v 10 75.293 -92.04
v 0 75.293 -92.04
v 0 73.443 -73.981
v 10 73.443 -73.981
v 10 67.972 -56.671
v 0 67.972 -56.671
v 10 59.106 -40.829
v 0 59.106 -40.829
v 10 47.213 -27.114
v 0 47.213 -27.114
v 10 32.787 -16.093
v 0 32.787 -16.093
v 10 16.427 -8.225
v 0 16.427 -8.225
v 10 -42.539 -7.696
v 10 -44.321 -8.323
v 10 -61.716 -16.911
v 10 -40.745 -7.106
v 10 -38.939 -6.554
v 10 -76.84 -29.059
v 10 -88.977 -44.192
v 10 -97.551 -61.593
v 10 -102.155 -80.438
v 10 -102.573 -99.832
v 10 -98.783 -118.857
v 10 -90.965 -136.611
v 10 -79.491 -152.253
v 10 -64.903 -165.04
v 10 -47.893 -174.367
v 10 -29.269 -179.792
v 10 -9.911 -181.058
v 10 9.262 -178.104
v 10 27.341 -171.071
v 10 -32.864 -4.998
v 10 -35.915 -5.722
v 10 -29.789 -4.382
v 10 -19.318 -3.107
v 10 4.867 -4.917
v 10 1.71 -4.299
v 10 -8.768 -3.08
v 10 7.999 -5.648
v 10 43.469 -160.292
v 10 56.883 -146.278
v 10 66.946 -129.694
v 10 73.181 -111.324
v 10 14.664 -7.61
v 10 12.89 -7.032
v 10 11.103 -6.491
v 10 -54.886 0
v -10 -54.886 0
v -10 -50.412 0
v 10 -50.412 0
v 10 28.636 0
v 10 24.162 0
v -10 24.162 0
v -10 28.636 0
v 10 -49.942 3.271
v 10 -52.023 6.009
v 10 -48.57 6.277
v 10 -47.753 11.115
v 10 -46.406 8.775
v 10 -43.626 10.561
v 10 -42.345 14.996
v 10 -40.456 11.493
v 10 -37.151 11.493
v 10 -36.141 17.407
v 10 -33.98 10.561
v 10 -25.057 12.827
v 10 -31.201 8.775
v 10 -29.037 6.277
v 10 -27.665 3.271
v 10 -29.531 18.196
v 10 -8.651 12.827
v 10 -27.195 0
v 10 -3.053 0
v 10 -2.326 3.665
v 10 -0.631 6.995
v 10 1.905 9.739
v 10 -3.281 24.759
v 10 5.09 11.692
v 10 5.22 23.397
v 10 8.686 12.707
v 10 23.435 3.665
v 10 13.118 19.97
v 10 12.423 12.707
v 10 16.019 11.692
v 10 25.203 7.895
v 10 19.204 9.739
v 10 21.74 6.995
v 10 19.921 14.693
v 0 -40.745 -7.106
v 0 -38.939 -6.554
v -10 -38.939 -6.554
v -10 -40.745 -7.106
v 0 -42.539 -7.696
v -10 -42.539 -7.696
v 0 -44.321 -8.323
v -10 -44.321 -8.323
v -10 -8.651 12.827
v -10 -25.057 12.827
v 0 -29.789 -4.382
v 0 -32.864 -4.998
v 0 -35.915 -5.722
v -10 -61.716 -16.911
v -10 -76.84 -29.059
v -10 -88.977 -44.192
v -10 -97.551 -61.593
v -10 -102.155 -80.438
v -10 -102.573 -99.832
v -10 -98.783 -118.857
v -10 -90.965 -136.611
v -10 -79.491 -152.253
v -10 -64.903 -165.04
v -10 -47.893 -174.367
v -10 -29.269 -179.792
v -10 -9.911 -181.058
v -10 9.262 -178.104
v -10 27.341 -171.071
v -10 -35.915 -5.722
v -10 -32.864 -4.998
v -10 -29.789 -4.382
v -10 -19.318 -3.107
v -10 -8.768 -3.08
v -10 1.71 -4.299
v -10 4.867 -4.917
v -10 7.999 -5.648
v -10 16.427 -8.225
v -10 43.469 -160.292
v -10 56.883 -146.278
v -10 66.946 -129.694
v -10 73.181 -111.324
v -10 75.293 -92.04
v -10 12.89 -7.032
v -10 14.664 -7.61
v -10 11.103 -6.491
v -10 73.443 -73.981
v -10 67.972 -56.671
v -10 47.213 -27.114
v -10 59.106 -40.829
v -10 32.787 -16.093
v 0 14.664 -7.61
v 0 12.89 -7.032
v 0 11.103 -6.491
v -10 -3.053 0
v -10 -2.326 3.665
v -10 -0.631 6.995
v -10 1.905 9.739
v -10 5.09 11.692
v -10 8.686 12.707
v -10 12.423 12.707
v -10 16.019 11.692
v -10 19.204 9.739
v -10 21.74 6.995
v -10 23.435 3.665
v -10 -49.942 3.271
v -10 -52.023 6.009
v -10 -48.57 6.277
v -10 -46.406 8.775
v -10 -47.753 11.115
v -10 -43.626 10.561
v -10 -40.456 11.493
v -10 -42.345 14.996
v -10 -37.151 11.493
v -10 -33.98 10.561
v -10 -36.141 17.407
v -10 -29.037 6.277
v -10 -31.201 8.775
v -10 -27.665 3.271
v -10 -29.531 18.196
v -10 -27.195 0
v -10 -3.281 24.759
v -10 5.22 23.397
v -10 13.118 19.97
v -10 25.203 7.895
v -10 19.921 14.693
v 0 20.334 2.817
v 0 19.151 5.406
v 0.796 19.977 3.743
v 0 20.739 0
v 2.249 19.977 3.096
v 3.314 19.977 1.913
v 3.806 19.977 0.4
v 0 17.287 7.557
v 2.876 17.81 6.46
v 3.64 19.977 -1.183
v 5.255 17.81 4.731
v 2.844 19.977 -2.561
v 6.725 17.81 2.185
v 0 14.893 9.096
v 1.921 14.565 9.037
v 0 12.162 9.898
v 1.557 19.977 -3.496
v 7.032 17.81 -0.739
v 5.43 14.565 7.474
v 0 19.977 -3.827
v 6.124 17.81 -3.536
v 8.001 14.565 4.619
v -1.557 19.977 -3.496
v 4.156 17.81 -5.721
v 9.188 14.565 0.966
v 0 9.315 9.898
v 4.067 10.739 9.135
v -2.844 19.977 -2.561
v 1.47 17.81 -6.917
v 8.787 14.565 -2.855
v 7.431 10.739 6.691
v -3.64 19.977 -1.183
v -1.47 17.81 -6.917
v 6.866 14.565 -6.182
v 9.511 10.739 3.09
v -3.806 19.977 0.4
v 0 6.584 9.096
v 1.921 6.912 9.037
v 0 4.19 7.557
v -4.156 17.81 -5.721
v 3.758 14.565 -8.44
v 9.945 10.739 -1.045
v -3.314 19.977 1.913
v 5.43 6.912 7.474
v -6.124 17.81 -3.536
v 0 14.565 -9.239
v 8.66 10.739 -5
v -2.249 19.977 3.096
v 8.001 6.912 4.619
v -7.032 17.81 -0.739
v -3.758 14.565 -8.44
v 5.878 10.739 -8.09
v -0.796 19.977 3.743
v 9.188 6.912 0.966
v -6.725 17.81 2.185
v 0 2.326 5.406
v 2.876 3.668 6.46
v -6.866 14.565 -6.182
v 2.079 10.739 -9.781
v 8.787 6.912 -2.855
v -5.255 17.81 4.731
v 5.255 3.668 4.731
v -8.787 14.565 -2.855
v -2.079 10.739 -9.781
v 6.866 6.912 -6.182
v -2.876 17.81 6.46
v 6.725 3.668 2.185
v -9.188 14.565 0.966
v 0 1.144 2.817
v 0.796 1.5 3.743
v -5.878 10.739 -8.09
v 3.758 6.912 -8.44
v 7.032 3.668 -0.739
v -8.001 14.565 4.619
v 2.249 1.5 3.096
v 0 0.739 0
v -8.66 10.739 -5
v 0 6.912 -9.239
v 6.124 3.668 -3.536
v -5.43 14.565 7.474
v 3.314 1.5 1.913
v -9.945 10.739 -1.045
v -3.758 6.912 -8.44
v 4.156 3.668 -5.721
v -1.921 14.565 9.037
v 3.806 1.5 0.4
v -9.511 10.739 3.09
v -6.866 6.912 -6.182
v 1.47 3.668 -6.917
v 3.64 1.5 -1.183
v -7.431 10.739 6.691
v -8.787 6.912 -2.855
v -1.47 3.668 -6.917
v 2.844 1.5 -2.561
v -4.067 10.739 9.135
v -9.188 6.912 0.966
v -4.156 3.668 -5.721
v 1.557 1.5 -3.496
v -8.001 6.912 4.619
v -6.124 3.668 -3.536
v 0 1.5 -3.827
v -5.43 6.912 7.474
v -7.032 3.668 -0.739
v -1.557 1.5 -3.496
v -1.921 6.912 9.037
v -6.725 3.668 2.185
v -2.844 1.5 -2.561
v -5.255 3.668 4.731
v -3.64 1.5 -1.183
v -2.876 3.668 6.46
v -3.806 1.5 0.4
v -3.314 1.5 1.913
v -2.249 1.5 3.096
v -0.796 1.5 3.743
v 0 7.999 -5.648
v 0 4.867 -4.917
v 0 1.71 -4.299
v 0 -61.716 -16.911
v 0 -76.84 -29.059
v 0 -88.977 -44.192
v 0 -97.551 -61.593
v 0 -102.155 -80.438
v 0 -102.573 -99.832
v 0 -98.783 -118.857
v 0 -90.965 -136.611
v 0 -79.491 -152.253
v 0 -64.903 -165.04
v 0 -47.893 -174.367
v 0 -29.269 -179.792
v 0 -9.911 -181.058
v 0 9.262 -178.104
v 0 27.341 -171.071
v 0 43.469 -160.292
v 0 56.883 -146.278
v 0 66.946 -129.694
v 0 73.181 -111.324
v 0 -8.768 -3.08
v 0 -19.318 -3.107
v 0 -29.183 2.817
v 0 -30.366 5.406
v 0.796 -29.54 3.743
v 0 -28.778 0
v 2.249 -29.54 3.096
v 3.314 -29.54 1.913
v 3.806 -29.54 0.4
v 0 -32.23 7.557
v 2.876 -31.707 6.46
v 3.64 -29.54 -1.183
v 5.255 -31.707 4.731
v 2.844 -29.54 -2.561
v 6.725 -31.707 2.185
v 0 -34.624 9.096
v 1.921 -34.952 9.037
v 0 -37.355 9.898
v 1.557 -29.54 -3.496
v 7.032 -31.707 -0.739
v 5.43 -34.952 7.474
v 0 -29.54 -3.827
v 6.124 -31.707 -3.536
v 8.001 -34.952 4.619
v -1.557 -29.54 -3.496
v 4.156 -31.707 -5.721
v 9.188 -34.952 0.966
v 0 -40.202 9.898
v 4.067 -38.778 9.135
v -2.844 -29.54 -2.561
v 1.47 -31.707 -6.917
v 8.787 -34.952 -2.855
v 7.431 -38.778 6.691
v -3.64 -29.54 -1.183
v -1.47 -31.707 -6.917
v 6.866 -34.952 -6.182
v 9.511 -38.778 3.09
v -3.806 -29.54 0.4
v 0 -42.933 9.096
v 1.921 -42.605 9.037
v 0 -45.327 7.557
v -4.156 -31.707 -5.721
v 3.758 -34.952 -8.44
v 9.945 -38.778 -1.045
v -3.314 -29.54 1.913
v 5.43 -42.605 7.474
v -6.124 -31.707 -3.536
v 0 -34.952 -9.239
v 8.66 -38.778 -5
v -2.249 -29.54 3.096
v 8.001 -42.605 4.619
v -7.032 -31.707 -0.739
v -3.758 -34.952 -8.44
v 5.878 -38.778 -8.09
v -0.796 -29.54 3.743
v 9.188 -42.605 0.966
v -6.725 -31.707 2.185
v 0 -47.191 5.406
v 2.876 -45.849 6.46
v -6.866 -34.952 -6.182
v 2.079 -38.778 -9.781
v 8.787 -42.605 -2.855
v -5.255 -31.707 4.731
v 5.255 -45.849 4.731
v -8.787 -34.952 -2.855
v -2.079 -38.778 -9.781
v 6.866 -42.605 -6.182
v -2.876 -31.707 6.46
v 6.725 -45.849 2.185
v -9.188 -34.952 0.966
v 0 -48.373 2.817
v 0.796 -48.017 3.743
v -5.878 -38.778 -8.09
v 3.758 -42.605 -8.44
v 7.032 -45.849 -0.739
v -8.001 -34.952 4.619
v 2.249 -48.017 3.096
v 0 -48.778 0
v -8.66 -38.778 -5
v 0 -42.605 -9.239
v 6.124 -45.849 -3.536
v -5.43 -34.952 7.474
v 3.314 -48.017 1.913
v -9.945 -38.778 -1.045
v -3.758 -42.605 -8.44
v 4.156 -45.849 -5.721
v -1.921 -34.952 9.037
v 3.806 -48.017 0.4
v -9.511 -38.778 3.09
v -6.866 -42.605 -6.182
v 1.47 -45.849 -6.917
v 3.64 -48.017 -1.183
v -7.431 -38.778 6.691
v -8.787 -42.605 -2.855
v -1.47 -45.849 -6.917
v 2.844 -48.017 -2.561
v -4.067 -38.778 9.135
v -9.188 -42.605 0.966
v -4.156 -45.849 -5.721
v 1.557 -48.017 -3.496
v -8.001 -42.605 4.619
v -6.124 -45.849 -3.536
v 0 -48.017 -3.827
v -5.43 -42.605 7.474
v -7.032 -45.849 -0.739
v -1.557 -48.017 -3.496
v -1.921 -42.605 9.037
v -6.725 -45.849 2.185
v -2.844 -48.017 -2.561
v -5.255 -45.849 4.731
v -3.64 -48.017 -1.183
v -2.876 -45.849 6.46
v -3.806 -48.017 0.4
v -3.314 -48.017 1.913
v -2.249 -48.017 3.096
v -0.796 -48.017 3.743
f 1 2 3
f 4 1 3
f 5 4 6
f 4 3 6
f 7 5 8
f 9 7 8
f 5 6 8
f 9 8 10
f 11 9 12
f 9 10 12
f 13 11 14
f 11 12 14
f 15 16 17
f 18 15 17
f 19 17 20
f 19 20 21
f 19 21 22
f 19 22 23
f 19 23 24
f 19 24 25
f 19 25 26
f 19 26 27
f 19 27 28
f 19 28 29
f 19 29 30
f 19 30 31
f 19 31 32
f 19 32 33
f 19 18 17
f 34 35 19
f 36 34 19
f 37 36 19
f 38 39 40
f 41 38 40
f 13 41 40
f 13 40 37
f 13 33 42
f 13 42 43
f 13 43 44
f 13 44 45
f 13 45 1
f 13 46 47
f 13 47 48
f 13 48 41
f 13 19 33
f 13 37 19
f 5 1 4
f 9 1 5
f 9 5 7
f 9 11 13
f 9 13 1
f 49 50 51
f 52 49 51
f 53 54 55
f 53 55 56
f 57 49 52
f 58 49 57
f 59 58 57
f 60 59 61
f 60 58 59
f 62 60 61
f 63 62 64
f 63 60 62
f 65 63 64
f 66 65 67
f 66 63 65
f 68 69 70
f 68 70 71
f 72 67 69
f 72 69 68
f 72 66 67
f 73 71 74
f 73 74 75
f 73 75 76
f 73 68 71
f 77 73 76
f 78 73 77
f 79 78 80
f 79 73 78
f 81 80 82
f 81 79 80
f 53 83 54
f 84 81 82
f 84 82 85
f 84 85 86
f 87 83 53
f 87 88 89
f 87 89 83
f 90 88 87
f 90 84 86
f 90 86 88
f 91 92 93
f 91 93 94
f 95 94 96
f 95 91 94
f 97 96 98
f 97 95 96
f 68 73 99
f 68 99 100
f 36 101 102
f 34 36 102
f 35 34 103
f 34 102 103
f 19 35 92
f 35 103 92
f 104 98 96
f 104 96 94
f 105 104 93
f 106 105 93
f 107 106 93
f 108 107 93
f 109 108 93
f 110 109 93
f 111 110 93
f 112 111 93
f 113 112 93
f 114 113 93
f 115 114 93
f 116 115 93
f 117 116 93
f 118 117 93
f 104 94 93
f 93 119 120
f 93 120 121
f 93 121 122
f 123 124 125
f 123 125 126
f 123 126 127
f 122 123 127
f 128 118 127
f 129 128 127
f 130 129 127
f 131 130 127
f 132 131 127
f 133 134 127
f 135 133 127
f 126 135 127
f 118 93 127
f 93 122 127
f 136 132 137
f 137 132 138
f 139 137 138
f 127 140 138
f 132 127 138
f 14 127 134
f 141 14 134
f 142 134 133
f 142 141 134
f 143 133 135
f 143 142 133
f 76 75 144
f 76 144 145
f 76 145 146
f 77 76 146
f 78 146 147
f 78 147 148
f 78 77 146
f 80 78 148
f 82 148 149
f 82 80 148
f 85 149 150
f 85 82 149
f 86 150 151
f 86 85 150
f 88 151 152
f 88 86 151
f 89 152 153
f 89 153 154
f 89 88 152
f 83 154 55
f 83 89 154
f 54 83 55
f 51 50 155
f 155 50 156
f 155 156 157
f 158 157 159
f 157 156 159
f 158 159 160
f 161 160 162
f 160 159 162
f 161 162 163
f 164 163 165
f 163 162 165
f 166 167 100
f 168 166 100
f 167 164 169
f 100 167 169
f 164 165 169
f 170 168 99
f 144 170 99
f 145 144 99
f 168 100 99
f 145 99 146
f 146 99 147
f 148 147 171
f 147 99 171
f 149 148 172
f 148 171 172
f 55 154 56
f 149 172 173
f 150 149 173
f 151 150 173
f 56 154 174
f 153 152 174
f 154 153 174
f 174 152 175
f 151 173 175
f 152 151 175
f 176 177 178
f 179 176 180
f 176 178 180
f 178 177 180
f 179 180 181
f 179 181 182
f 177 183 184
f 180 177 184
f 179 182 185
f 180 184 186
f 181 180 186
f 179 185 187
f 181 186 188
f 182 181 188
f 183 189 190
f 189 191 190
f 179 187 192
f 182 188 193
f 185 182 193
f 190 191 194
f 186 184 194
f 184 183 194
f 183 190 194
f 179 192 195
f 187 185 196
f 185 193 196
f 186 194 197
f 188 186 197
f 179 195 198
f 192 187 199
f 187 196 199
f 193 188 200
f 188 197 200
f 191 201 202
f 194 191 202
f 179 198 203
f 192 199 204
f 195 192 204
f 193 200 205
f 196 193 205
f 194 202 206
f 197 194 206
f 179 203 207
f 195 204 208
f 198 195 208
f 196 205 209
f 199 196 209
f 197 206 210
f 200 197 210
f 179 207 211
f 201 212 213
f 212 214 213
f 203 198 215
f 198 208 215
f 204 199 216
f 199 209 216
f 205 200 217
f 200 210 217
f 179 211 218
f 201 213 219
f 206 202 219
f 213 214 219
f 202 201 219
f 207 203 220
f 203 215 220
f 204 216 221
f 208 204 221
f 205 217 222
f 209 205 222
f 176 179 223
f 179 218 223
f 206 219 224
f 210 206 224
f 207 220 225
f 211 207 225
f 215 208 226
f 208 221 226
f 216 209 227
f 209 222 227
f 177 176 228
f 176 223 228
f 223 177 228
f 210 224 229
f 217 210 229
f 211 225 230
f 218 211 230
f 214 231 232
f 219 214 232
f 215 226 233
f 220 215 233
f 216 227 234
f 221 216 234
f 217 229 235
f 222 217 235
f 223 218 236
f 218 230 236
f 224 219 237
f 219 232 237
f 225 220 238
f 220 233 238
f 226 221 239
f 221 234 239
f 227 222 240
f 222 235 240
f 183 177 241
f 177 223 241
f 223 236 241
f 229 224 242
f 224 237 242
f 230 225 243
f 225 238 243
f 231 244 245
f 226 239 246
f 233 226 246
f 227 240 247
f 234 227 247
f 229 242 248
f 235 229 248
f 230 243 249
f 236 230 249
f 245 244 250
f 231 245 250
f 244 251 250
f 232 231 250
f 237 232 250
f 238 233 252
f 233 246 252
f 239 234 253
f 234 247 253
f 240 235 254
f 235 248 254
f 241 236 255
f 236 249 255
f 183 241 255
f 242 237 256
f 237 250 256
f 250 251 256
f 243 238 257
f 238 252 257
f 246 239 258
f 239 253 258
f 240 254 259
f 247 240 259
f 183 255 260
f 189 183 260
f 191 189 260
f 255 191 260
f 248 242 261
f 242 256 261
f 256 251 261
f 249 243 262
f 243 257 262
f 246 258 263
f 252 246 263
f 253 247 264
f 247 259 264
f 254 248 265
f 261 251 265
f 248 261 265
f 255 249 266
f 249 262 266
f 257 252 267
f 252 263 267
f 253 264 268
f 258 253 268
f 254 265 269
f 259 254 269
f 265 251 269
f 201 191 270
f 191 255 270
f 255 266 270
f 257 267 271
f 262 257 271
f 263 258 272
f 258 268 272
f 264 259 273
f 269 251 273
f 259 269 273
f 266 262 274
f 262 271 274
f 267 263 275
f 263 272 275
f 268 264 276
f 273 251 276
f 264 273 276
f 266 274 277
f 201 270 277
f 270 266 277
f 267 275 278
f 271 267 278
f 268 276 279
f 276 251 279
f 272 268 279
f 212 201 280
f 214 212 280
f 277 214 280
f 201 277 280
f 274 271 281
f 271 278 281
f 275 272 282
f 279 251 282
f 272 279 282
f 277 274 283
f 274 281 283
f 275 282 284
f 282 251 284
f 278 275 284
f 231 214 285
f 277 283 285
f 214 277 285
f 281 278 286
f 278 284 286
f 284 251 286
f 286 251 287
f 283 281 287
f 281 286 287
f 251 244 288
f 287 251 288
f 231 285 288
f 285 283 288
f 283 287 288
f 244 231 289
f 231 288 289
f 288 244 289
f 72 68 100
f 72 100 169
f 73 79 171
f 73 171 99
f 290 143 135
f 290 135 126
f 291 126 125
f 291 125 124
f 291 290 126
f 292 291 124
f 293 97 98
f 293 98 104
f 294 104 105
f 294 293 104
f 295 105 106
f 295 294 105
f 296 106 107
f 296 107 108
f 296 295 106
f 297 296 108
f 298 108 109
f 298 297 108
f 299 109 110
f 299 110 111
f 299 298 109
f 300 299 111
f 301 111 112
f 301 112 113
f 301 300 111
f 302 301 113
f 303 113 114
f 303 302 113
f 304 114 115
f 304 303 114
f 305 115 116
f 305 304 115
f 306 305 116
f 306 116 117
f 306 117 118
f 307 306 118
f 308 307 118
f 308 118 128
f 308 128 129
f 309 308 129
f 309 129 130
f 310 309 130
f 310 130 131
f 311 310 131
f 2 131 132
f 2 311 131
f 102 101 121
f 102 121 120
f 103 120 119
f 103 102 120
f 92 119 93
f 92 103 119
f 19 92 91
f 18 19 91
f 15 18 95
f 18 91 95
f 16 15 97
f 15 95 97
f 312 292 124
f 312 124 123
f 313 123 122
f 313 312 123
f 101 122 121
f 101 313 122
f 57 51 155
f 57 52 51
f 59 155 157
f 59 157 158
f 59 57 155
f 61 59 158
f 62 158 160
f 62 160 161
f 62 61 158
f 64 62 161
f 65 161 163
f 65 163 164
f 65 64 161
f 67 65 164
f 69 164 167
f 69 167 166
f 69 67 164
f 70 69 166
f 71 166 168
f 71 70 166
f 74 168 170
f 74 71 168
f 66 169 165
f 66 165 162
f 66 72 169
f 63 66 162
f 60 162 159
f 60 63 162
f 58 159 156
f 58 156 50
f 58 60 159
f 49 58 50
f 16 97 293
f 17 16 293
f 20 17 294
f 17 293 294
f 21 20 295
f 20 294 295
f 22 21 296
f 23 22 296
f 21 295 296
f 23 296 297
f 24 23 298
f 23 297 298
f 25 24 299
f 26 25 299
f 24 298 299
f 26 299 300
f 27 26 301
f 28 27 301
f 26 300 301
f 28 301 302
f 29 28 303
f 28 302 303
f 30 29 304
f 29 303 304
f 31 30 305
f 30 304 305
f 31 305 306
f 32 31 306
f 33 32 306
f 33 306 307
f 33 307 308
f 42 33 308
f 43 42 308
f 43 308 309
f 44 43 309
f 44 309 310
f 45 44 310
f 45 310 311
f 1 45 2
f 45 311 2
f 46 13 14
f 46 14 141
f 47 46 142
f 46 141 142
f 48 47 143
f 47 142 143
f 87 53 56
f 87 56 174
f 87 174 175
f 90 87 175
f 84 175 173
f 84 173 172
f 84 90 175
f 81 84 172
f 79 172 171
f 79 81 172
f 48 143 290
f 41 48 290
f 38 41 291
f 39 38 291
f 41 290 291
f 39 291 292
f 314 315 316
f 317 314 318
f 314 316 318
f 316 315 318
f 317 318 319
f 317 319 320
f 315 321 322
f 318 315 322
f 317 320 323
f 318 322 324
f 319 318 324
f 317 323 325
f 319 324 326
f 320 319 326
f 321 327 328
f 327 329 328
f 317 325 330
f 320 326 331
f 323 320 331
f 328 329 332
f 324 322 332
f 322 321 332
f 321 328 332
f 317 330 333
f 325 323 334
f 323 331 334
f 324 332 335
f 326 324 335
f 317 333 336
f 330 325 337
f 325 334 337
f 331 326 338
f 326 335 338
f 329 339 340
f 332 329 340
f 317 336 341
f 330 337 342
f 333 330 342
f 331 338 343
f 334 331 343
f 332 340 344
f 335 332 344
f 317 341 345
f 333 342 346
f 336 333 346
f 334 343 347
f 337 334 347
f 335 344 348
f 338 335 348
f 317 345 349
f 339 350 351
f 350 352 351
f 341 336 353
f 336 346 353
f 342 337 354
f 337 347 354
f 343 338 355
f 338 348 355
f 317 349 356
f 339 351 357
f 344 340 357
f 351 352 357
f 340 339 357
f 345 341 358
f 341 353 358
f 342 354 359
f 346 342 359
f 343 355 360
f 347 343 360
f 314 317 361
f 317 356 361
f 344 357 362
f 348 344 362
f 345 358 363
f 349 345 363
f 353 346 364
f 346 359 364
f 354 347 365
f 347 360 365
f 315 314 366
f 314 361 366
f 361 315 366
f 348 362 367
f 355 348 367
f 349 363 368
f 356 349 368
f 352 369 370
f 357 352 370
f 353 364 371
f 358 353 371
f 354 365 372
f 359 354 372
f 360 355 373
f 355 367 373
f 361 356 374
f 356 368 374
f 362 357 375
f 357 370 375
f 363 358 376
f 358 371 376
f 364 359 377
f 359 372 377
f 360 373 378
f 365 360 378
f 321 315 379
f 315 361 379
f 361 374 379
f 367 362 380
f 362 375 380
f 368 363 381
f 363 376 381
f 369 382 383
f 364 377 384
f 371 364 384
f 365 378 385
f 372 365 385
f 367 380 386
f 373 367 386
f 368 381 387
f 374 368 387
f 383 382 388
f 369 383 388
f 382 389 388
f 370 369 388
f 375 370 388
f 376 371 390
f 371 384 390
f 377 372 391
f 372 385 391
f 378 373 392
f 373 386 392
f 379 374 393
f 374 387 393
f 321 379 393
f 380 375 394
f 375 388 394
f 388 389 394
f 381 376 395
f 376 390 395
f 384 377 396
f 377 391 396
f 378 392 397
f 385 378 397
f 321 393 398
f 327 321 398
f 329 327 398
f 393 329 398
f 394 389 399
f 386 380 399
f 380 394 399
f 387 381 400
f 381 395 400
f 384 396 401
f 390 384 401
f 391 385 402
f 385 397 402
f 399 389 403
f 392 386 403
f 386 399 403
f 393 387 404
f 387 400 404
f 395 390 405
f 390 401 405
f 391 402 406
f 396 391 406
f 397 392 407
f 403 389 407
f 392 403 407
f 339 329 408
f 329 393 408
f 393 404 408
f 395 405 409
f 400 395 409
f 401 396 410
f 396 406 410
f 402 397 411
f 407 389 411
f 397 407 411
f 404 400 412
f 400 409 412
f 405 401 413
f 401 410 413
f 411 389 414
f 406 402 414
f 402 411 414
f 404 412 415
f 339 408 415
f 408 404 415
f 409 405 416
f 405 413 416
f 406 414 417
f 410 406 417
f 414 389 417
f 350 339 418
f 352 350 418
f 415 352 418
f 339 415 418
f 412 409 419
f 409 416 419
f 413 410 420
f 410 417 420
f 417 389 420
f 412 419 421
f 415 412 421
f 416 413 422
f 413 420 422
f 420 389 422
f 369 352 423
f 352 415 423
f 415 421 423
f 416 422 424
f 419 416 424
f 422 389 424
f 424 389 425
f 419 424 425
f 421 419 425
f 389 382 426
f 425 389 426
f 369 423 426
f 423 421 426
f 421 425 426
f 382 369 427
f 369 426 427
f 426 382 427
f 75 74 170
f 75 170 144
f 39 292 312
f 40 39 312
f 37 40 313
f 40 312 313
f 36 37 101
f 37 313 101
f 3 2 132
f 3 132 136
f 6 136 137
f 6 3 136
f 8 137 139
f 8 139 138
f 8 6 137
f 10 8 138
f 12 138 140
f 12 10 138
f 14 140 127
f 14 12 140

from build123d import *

# Parameters (mm, degrees)
F2_DEPTH      = 10
F2_DEPTH_BACK = 10
F3_DEPTH      = 10
F3_DEPTH_BACK = 10


with BuildPart() as f1:
    # F0 (on Right) → F1 (revolve)
    with BuildSketch(Plane.YZ):
        with BuildLine():
            Line((-38.7784093618, 0), (-28.7784093618, 0))
            ThreePointArc((-28.7784093618, 0), (-38.7784093618, 10), (-48.7784093618, 0))
            Line((-48.7784093618, 0), (-38.7784093618, 0))
        make_face()
    revolve(axis=Axis((0, -14.0198855661, 0), (0, 1, 0)))


with BuildPart() as f1b:
    # F0 (on Right) → F1, piece 2 (revolve)
    with BuildSketch(Plane.YZ):
        with BuildLine():
            ThreePointArc((20.7386382297, 0), (10.7386382297, 10), (0.7386382297, 0))
            Line((0.7386382297, 0), (10.7386382297, 0))
            Line((10.7386382297, 0), (20.7386382297, 0))
        make_face()
    revolve(axis=Axis((0, -14.0198855661, 0), (0, 1, 0)))


with BuildPart() as f2:
    # F0 (on Right) → F2 (new body, two sides)
    with BuildSketch(Plane.YZ) as f2_sk:
        with BuildLine():
            ThreePointArc((-50.4119358957, 0), (-38.8033691557, 11.6107195707), (-27.1948024158, 0))
            Line((-27.1948024158, 0), (-3.0528949055, 0))
            ThreePointArc((-3.0528949055, 0), (10.5545190422, 12.8352438109), (24.16193299, 0))
            Line((24.16193299, 0), (28.6363661289, 0))
            ThreePointArc((28.6363661289, 0), (16.6846966655, 17.5450922675), (-3.2812512945, 24.7585233301))
            Line((-3.2812512945, 24.7585233301), (-8.6505692452, 12.8267044201))
            Line((-8.6505692452, 12.8267044201), (-25.0568185002, 12.8267044201))
            Line((-25.0568185002, 12.8267044201), (-29.5312516391, 18.1960240006))
            ThreePointArc((-29.5312516391, 18.1960240006), (-45.1714995095, 13.2263526785), (-54.8863634467, 0))
            Line((-54.8863634467, 0), (-50.4119358957, 0))
        make_face()
    extrude(amount=F2_DEPTH)
    extrude(f2_sk.sketch, amount=-F2_DEPTH_BACK)


with BuildPart() as f3:
    # F0 (on Right) → F3 (new body, two sides)
    with BuildSketch(Plane.YZ) as f3_sk:
        with BuildLine():
            ThreePointArc((1.7100001057, -4.2992666382), (-14.0433656752, -2.9374034586), (-29.7894036735, -4.3815267585))
            ThreePointArc((-29.7894036735, -4.3815267585), (-36.1603319482, -9.6512004775), (-44.3209305081, -8.3234884119))
            ThreePointArc((-44.3209305081, -8.3234884119), (-64.9028354001, -165.0400861413), (75.2925169547, -92.0402916829))
            ThreePointArc((75.2925169547, -92.0402916829), (59.1058533817, -40.8293679595), (16.426865836, -8.2246013094))
            ThreePointArc((16.426865836, -8.2246013094), (8.1614985989, -9.662212548), (1.7100001057, -4.2992666382))
        make_face()
        with BuildLine():
            ThreePointArc((-44.3209305081, -8.3234884119), (-36.1603319482, -9.6512004775), (-29.7894036735, -4.3815267585))
            ThreePointArc((-29.7894036735, -4.3815267585), (-34.3927217868, -5.3468190964), (-38.9386899769, -6.5536745824))
            ThreePointArc((-38.9386899769, -6.5536745824), (-41.6438808141, -7.3957910072), (-44.3209305081, -8.3234884119))
        make_face()
        with BuildLine():
            ThreePointArc((11.1030079424, -6.4909653738), (6.4361818801, -5.2679250151), (1.7100001057, -4.2992666382))
            ThreePointArc((1.7100001057, -4.2992666382), (8.1614985989, -9.662212548), (16.426865836, -8.2246013094))
            ThreePointArc((16.426865836, -8.2246013094), (13.7785574006, -7.315955836), (11.1030079424, -6.4909653738))
        make_face()
    extrude(amount=F3_DEPTH)
    extrude(f3_sk.sketch, amount=-F3_DEPTH_BACK)


solid = Compound([f1.part, f1b.part, f2.part, f3.part])
